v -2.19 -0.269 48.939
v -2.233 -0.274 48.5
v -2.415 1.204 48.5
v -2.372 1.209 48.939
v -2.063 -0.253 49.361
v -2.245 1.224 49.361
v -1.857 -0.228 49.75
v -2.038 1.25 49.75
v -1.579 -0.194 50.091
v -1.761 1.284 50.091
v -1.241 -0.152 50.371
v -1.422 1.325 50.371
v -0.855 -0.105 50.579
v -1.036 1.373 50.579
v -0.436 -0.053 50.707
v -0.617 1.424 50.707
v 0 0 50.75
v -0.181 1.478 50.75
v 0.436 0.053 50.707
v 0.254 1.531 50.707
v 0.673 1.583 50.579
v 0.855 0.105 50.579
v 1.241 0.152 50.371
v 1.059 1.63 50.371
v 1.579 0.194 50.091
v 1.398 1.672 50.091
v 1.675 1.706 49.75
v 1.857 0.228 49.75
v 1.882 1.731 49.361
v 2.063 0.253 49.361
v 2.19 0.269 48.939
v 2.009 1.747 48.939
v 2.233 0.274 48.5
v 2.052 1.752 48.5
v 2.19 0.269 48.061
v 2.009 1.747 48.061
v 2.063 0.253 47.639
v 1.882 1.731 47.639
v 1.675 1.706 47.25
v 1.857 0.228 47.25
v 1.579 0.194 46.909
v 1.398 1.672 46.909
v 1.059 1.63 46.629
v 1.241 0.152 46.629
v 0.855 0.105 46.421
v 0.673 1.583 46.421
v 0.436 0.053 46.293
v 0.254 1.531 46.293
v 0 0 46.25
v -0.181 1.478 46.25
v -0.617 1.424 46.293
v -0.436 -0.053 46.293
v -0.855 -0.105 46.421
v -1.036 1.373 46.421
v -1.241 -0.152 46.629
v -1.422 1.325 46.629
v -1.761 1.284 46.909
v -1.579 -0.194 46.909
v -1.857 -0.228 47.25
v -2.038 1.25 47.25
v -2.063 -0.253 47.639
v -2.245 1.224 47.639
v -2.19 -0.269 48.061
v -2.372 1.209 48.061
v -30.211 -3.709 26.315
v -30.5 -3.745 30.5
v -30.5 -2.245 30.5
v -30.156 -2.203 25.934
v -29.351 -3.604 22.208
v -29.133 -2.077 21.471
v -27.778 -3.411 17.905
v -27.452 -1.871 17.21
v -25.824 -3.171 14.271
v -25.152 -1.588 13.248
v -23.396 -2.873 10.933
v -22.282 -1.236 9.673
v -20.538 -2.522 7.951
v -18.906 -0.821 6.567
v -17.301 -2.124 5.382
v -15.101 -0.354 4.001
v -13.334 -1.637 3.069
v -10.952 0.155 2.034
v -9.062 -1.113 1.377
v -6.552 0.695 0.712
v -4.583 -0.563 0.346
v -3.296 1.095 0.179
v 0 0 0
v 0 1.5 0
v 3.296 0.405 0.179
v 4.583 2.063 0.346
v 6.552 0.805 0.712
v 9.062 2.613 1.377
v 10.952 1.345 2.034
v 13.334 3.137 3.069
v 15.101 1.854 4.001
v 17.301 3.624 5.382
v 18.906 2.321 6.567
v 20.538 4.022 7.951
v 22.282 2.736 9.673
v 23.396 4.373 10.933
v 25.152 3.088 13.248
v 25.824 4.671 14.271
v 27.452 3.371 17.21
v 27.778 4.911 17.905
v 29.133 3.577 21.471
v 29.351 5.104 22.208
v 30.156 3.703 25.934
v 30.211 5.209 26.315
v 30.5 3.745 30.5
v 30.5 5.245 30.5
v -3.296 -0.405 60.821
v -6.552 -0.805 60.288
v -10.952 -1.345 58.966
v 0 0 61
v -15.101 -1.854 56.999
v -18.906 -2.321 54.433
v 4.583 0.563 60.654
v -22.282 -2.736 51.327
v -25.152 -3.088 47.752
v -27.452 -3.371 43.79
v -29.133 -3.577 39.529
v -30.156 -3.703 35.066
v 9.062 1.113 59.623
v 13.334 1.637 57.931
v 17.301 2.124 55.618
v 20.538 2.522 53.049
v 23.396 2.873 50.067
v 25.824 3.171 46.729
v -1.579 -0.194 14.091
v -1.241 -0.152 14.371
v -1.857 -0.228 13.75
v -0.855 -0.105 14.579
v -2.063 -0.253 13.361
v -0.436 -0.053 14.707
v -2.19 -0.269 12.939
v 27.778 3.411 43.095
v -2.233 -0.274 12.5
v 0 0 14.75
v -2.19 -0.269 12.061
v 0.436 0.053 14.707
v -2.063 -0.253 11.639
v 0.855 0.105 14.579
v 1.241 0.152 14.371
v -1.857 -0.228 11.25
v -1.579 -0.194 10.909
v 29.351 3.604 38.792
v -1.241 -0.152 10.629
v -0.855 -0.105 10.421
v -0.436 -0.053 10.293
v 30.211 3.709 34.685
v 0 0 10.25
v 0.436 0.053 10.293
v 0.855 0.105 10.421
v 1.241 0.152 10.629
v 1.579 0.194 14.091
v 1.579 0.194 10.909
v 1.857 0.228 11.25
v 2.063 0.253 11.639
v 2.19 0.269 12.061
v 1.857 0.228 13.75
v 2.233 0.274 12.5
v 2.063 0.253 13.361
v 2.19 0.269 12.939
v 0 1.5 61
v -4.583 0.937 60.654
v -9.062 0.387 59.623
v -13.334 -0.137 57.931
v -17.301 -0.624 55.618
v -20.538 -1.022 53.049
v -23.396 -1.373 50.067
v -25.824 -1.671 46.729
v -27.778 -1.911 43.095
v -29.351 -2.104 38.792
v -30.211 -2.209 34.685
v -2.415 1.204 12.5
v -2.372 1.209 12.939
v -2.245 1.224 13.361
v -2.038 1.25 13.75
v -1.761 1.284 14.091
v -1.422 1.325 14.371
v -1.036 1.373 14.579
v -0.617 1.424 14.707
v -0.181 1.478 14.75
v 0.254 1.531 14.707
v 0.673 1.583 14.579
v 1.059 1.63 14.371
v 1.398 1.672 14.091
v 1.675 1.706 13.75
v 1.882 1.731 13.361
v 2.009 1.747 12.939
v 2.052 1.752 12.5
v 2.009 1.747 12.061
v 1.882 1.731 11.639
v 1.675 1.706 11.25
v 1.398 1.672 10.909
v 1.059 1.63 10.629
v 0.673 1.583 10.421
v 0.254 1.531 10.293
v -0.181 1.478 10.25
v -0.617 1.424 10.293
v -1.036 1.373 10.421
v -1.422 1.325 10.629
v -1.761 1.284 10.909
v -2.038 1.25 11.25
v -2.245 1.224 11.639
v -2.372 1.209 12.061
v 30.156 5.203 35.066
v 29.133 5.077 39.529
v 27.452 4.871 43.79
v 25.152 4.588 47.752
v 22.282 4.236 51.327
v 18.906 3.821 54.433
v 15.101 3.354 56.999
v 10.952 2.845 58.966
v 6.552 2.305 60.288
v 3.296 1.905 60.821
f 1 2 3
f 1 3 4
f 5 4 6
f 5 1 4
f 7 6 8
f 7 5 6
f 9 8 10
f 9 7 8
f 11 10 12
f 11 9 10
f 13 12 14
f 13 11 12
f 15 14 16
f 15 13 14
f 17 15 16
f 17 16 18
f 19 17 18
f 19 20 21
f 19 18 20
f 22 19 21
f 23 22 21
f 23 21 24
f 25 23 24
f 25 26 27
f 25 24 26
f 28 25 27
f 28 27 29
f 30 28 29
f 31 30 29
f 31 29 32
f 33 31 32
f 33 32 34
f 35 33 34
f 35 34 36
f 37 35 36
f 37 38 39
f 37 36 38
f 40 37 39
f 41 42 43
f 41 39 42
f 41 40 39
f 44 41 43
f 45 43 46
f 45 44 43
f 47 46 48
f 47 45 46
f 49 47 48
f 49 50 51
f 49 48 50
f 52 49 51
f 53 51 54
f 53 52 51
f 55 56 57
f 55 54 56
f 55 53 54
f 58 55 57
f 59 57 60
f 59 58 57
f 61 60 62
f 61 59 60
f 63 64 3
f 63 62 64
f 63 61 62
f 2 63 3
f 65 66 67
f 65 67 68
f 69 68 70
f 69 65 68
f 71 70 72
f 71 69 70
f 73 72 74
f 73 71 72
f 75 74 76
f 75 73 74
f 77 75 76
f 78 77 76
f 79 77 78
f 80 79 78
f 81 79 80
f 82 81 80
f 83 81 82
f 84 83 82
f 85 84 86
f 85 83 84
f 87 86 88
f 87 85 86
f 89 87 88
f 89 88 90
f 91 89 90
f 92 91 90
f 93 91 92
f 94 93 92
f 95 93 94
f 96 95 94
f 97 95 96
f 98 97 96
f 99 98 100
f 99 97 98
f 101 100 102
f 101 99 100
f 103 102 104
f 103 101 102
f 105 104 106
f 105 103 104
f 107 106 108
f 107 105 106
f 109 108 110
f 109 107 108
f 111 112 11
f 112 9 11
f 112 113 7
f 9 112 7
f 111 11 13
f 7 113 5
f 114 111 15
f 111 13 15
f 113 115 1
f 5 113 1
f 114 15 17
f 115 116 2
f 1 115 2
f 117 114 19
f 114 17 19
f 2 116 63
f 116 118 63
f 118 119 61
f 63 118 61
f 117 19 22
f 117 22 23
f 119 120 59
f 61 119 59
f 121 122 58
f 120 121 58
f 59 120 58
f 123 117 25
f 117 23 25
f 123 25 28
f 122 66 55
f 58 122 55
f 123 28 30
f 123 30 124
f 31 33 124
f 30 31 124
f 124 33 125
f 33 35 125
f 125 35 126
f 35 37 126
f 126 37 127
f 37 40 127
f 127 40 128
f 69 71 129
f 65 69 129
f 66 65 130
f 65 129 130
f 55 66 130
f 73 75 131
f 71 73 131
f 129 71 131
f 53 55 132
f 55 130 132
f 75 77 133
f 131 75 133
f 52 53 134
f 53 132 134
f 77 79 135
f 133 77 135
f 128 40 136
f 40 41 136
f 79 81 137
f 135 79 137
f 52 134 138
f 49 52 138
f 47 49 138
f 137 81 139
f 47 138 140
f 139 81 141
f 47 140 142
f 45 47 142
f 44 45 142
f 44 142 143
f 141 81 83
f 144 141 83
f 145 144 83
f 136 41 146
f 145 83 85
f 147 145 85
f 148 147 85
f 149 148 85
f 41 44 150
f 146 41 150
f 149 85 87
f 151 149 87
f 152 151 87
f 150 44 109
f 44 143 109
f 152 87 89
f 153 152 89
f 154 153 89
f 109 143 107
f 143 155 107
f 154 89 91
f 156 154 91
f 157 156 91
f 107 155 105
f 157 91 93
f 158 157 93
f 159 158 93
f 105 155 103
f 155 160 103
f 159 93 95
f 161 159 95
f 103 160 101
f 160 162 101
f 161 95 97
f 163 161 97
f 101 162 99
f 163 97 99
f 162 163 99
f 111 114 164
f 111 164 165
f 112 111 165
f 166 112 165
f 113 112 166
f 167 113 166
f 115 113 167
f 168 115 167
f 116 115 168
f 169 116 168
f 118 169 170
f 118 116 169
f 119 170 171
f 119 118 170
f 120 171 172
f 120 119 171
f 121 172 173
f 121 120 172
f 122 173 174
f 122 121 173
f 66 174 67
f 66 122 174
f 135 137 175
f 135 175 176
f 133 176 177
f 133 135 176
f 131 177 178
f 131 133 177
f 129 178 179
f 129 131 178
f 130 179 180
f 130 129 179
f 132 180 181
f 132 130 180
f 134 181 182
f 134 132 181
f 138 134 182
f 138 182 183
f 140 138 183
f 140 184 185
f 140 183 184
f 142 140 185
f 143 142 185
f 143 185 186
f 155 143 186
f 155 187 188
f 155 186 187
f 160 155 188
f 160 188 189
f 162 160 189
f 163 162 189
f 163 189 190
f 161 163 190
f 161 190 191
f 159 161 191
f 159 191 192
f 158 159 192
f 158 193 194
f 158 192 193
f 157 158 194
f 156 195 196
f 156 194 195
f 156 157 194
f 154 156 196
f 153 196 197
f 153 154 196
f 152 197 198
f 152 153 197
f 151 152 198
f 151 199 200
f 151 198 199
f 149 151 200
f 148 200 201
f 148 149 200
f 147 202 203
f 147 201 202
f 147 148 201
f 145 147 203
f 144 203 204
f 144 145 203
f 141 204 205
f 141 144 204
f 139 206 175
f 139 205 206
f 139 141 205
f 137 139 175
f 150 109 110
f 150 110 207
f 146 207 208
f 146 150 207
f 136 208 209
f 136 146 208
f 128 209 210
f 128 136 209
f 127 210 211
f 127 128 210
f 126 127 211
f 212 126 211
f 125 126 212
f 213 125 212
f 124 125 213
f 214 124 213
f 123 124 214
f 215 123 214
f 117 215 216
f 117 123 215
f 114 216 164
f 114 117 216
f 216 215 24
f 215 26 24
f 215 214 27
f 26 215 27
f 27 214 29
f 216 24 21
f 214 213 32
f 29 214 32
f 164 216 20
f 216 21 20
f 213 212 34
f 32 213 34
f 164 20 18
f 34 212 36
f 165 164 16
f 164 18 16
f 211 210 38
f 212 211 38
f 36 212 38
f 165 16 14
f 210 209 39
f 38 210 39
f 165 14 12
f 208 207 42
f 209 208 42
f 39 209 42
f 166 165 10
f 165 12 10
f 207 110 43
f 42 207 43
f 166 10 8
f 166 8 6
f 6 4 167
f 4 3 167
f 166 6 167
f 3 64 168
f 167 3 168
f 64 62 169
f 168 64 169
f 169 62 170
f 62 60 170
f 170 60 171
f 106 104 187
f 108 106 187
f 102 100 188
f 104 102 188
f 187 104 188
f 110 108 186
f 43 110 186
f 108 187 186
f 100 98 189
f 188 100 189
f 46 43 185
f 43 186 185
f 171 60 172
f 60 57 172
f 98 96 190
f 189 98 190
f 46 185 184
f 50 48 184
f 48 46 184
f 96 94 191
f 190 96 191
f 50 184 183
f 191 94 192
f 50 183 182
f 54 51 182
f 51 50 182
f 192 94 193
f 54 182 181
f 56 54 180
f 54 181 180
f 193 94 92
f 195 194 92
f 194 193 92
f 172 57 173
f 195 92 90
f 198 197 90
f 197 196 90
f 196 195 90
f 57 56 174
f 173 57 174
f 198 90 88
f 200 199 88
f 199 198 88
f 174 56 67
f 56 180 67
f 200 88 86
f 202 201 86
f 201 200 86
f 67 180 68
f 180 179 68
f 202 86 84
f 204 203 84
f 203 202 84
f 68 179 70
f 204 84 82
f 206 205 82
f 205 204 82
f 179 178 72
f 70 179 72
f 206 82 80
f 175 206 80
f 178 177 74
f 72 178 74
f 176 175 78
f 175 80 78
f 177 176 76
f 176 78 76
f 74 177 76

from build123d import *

# Parameters (mm, degrees)
BOSS_EXTRUDE1_DEPTH     = 61
CUT_EXTRUDE7_DEPTH      = 69.401456719
CUT_EXTRUDE7_DEPTH_BACK = 69.401456719
CUT_EXTRUDE9_DEPTH      = 69.480850828
CUT_EXTRUDE9_DEPTH_BACK = 69.480850828
SKETCH11_R              = 2.25


with BuildPart() as part:
    # Sketch1 → Boss-Extrude1 (new body)
    with BuildSketch(Plane.XY):
        Polygon((-30.5, -2.244929108), (-30.5, -3.744929108), (30.5, 3.744929108), (30.5, 5.244929108), align=None)
    extrude(amount=BOSS_EXTRUDE1_DEPTH)

    # Sketch7 → Cut-Extrude7 (cut, two sides: drawn at the far end of the back side and taken through both)
    with BuildSketch(Plane(origin=(0, 0, 0), x_dir=(1, 0, 0), z_dir=(0, 1, 0)).offset(-CUT_EXTRUDE7_DEPTH_BACK)):
        with BuildLine():
            Line((9.4e-08, 0), (-30.5, 0))
            Line((-30.5, 0), (-30.5, -30.5))
            ThreePointArc((-30.5, -30.5), (-21.566756793, -8.933243141), (9.4e-08, 0))
        make_face()
        with BuildLine():
            Line((30.5, 0), (9.4e-08, 0))
            ThreePointArc((9.4e-08, 0), (21.566756859, -8.933243207), (30.5, -30.5))
            Line((30.5, -30.5), (30.5, 0))
        make_face()
        with BuildLine():
            ThreePointArc((-8e-09, -61), (-21.566756829, -52.066756823), (-30.5, -30.5))
            Line((-30.5, -30.5), (-30.5, -61))
            Line((-30.5, -61), (-8e-09, -61))
        make_face()
        with BuildLine():
            Line((30.5, -61), (30.5, -30.5))
            ThreePointArc((30.5, -30.5), (21.566756823, -52.066756829), (-8e-09, -61))
            Line((-8e-09, -61), (30.5, -61))
        make_face()
    extrude(amount=CUT_EXTRUDE7_DEPTH + CUT_EXTRUDE7_DEPTH_BACK, mode=Mode.SUBTRACT)

    # Sketch11 → Cut-Extrude9 (cut, two sides: drawn at the far end of the back side and taken through both)
    with BuildSketch(Plane(origin=(-0.181441422, 1.477721795, 0), x_dir=(0.992546151641322, 0.12186934340514832, 0), z_dir=(-0.12186934340514831, 0.9925461516413219, 0)).offset(-CUT_EXTRUDE9_DEPTH_BACK)):
        with Locations((0, -12.5)):
            Circle(SKETCH11_R)
        with Locations((0, -48.5)):
            Circle(SKETCH11_R)
    extrude(amount=CUT_EXTRUDE9_DEPTH + CUT_EXTRUDE9_DEPTH_BACK, mode=Mode.SUBTRACT)


solid = part.part
